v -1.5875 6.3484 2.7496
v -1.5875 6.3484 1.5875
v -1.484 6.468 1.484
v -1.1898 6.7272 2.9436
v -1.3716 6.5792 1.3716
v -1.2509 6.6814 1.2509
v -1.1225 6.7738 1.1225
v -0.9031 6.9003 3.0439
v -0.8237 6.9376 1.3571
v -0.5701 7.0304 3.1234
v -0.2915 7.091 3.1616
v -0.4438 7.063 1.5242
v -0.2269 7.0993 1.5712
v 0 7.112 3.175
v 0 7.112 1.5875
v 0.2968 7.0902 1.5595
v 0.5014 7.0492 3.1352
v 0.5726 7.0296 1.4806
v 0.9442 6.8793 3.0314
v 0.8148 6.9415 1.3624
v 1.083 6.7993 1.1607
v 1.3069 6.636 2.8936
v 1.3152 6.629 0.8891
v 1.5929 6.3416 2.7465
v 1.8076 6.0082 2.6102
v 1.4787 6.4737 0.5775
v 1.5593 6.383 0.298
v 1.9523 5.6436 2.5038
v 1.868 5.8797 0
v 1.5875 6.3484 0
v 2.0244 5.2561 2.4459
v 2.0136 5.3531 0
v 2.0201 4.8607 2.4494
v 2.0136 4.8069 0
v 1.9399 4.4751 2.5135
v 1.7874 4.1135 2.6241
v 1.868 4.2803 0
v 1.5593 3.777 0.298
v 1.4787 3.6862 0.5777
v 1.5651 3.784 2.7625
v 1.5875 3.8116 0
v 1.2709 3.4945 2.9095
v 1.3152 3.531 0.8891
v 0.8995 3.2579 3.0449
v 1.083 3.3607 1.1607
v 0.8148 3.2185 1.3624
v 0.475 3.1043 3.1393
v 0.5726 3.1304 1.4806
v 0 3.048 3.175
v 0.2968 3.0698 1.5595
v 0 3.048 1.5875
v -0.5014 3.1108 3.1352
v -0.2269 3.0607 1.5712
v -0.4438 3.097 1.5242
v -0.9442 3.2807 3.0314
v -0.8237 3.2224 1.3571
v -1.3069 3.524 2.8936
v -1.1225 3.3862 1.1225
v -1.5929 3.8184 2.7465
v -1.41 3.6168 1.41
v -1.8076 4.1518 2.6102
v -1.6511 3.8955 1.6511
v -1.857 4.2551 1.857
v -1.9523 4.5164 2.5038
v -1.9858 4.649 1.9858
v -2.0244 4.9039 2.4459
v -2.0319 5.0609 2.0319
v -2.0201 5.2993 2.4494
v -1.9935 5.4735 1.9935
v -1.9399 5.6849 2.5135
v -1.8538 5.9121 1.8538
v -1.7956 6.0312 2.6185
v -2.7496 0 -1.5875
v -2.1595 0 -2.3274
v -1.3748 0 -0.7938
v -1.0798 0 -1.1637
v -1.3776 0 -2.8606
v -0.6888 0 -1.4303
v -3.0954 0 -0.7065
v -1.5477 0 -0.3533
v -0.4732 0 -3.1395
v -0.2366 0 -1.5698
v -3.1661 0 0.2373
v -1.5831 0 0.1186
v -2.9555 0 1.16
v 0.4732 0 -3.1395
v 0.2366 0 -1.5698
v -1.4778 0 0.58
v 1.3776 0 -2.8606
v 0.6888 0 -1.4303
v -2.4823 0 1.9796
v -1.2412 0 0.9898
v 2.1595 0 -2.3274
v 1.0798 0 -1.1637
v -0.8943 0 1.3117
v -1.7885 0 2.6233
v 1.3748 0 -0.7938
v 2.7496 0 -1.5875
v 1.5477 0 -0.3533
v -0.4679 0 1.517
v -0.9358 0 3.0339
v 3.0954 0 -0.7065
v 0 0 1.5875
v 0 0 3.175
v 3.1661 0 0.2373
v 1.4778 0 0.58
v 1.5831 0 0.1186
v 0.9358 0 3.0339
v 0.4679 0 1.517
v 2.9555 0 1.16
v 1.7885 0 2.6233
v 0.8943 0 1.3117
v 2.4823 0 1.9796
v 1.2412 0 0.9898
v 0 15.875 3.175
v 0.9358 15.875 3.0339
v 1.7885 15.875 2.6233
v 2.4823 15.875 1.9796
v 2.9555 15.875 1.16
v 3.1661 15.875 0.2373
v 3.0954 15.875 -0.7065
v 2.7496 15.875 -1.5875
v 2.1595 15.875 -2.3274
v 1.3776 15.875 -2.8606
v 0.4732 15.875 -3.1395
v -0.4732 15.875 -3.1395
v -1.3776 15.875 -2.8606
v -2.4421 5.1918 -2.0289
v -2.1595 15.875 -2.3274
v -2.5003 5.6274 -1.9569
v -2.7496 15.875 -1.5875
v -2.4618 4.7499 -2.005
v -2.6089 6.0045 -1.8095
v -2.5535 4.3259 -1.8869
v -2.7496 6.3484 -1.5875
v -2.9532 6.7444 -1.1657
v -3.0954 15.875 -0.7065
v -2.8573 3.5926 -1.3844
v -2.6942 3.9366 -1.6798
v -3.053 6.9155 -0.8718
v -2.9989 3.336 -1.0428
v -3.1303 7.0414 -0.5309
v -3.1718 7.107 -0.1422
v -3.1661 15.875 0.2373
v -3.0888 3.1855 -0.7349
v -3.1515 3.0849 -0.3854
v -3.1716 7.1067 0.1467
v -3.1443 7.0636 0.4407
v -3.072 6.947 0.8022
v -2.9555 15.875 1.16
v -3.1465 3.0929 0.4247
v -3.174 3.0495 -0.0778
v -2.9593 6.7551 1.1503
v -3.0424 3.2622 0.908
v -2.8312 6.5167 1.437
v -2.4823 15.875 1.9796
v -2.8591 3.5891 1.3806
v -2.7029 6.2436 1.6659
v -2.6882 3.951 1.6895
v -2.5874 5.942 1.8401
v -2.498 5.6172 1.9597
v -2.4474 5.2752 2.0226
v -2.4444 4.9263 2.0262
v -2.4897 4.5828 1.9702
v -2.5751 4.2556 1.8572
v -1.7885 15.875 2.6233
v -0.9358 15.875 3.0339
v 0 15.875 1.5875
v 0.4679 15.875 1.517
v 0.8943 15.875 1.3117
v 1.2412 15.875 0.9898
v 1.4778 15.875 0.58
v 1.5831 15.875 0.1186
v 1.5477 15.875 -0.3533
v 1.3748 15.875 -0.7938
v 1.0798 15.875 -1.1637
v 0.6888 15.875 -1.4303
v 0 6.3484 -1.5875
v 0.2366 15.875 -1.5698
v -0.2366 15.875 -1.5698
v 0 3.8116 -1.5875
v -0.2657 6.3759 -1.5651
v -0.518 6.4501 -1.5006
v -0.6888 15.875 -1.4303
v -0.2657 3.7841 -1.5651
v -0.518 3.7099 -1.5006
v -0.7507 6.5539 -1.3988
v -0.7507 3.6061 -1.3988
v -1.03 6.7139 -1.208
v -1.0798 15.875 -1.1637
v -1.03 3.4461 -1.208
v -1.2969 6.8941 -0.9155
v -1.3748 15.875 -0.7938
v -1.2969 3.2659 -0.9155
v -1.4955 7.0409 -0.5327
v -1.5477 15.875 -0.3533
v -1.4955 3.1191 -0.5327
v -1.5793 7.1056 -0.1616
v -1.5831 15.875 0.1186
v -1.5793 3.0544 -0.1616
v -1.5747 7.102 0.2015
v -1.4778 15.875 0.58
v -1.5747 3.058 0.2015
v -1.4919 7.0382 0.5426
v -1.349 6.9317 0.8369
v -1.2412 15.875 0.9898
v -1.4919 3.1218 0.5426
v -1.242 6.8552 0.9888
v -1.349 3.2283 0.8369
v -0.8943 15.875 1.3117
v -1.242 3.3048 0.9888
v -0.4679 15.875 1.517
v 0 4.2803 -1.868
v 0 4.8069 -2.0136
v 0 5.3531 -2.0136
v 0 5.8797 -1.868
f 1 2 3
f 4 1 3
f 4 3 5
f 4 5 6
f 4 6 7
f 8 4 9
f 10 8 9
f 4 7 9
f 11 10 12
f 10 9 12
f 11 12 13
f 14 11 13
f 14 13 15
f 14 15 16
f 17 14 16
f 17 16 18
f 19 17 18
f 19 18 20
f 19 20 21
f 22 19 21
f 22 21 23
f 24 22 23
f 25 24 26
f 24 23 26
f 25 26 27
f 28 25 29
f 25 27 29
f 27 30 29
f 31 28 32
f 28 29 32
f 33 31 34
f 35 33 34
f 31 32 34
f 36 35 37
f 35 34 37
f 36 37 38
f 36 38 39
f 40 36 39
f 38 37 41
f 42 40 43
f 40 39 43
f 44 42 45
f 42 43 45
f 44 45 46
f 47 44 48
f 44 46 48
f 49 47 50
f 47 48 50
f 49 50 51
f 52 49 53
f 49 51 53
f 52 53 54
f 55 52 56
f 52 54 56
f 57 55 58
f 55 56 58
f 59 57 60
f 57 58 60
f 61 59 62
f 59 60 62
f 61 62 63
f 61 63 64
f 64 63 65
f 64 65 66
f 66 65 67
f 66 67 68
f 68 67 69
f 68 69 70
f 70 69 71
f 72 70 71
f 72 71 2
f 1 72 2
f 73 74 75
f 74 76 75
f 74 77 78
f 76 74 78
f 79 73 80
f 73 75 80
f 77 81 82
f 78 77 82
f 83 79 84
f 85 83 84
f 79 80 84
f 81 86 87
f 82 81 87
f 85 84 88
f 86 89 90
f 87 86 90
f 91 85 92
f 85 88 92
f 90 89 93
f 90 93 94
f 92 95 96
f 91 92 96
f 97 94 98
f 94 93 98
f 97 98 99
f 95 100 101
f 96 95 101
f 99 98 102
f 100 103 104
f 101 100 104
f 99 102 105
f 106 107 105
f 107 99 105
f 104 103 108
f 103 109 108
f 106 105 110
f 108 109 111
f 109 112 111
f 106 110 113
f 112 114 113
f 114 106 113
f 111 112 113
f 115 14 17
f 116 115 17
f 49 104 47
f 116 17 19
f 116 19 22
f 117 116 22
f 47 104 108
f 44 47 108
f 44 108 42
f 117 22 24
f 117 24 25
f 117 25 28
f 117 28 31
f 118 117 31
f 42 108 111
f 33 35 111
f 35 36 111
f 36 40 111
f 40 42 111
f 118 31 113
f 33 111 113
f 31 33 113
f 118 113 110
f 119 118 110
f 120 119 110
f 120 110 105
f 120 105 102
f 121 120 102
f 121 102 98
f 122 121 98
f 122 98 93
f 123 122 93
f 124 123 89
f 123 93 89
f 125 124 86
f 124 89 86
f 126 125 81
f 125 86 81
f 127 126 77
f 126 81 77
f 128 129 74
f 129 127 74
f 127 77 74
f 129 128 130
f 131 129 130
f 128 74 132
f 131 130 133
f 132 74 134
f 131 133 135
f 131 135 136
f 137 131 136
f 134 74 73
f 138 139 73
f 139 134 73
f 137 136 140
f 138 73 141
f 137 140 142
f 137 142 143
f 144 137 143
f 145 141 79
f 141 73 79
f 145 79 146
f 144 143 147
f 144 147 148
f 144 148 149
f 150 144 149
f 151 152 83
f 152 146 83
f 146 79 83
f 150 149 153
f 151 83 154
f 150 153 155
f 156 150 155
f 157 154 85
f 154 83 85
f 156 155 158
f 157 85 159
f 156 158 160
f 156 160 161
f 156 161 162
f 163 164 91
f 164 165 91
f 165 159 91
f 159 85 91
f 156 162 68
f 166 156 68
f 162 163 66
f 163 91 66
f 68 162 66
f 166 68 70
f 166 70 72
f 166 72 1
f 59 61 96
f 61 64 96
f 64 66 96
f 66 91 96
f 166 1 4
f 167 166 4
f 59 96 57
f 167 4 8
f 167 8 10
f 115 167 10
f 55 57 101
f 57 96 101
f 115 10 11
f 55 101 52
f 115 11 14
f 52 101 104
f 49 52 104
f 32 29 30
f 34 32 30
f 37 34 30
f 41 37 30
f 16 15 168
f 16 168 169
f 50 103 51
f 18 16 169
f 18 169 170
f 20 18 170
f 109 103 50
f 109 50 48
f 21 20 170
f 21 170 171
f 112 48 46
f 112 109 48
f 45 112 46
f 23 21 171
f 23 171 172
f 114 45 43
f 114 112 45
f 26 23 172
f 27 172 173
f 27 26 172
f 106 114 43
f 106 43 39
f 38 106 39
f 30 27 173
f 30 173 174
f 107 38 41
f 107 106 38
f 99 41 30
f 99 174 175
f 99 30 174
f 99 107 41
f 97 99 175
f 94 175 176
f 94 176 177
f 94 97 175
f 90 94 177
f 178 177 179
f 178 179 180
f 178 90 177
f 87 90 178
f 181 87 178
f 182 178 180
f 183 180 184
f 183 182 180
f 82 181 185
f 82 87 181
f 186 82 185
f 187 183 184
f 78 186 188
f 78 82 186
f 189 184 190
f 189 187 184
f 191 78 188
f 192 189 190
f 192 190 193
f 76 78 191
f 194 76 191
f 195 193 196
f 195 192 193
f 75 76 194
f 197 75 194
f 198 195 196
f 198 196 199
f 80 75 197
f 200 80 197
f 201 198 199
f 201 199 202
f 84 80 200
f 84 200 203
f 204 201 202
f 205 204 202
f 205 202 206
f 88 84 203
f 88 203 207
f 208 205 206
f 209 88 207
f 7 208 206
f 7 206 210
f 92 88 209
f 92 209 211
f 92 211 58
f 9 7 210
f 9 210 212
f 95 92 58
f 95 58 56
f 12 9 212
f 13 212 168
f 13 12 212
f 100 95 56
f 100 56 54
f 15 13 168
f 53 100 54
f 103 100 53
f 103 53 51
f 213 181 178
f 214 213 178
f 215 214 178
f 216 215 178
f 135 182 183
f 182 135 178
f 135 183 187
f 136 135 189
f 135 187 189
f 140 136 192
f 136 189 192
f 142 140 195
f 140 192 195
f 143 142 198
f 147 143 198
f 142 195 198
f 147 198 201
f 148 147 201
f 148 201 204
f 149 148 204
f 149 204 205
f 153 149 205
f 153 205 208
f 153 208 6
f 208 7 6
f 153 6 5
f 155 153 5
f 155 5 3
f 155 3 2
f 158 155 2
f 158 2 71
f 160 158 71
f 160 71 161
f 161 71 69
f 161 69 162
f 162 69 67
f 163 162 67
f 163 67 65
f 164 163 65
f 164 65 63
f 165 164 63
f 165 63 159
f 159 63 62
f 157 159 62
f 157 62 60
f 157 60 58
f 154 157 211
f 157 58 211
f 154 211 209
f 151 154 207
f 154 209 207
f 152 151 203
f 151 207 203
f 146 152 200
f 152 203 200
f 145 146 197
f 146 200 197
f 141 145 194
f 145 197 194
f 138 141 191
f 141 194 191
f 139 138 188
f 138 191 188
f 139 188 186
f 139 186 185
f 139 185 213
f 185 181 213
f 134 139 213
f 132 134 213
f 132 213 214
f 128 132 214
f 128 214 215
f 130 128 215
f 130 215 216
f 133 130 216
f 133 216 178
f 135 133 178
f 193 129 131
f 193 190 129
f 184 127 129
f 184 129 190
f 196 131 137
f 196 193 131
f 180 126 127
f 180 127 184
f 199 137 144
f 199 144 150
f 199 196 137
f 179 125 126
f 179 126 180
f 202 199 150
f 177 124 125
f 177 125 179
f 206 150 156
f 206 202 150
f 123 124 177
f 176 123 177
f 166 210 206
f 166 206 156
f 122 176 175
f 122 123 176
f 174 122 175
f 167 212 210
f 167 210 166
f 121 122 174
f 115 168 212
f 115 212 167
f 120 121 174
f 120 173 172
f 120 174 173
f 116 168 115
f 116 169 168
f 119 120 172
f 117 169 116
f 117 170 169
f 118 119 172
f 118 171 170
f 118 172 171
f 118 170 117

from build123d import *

# Parameters (mm, degrees)
SKETCH1_R           = 3.175
SKETCH1_R_2         = 1.5875
BOSS_EXTRUDE1_DEPTH = 15.875
SKETCH2_R           = 2.032
CUT_EXTRUDE1_DEPTH  = 17.497783942
CIRPATTERN1_COUNT   = 2
CIRPATTERN1_ANGLE   = 90


with BuildPart() as part:
    # Sketch1 → Boss-Extrude1 (new body)
    with BuildSketch(Plane(origin=(0, 0, 0), x_dir=(1, 0, 0), z_dir=(0, 1, 0))):
        with Locations(Location((0, 0, 0), (0, 0, 270))):
            Circle(SKETCH1_R)
        with Locations(Location((0, 0, 0), (0, 0, 270))):
            Circle(SKETCH1_R_2, mode=Mode.SUBTRACT)
    extrude(amount=BOSS_EXTRUDE1_DEPTH)

    # Sketch2 → Cut-Extrude1 (cut, through all)
    with BuildSketch(Plane(origin=(0, 0, 0), x_dir=(0, 0, -1), z_dir=(1, 0, 0))):
        with Locations(Location((0, 5.08, 0), (0, 0, 38.624832873))):
            Circle(SKETCH2_R)
    cut_extrude1 = extrude(amount=-CUT_EXTRUDE1_DEPTH, mode=Mode.SUBTRACT)

    # CirPattern1: Cut-Extrude1 ×2 about axis
    cirpattern1_axis = Axis((0, 0, 0), (0, 1, 0))
    for i in range(1, CIRPATTERN1_COUNT):
        add(cut_extrude1.rotate(cirpattern1_axis, i * CIRPATTERN1_ANGLE / (CIRPATTERN1_COUNT - 1)), mode=Mode.SUBTRACT)


solid = part.part
